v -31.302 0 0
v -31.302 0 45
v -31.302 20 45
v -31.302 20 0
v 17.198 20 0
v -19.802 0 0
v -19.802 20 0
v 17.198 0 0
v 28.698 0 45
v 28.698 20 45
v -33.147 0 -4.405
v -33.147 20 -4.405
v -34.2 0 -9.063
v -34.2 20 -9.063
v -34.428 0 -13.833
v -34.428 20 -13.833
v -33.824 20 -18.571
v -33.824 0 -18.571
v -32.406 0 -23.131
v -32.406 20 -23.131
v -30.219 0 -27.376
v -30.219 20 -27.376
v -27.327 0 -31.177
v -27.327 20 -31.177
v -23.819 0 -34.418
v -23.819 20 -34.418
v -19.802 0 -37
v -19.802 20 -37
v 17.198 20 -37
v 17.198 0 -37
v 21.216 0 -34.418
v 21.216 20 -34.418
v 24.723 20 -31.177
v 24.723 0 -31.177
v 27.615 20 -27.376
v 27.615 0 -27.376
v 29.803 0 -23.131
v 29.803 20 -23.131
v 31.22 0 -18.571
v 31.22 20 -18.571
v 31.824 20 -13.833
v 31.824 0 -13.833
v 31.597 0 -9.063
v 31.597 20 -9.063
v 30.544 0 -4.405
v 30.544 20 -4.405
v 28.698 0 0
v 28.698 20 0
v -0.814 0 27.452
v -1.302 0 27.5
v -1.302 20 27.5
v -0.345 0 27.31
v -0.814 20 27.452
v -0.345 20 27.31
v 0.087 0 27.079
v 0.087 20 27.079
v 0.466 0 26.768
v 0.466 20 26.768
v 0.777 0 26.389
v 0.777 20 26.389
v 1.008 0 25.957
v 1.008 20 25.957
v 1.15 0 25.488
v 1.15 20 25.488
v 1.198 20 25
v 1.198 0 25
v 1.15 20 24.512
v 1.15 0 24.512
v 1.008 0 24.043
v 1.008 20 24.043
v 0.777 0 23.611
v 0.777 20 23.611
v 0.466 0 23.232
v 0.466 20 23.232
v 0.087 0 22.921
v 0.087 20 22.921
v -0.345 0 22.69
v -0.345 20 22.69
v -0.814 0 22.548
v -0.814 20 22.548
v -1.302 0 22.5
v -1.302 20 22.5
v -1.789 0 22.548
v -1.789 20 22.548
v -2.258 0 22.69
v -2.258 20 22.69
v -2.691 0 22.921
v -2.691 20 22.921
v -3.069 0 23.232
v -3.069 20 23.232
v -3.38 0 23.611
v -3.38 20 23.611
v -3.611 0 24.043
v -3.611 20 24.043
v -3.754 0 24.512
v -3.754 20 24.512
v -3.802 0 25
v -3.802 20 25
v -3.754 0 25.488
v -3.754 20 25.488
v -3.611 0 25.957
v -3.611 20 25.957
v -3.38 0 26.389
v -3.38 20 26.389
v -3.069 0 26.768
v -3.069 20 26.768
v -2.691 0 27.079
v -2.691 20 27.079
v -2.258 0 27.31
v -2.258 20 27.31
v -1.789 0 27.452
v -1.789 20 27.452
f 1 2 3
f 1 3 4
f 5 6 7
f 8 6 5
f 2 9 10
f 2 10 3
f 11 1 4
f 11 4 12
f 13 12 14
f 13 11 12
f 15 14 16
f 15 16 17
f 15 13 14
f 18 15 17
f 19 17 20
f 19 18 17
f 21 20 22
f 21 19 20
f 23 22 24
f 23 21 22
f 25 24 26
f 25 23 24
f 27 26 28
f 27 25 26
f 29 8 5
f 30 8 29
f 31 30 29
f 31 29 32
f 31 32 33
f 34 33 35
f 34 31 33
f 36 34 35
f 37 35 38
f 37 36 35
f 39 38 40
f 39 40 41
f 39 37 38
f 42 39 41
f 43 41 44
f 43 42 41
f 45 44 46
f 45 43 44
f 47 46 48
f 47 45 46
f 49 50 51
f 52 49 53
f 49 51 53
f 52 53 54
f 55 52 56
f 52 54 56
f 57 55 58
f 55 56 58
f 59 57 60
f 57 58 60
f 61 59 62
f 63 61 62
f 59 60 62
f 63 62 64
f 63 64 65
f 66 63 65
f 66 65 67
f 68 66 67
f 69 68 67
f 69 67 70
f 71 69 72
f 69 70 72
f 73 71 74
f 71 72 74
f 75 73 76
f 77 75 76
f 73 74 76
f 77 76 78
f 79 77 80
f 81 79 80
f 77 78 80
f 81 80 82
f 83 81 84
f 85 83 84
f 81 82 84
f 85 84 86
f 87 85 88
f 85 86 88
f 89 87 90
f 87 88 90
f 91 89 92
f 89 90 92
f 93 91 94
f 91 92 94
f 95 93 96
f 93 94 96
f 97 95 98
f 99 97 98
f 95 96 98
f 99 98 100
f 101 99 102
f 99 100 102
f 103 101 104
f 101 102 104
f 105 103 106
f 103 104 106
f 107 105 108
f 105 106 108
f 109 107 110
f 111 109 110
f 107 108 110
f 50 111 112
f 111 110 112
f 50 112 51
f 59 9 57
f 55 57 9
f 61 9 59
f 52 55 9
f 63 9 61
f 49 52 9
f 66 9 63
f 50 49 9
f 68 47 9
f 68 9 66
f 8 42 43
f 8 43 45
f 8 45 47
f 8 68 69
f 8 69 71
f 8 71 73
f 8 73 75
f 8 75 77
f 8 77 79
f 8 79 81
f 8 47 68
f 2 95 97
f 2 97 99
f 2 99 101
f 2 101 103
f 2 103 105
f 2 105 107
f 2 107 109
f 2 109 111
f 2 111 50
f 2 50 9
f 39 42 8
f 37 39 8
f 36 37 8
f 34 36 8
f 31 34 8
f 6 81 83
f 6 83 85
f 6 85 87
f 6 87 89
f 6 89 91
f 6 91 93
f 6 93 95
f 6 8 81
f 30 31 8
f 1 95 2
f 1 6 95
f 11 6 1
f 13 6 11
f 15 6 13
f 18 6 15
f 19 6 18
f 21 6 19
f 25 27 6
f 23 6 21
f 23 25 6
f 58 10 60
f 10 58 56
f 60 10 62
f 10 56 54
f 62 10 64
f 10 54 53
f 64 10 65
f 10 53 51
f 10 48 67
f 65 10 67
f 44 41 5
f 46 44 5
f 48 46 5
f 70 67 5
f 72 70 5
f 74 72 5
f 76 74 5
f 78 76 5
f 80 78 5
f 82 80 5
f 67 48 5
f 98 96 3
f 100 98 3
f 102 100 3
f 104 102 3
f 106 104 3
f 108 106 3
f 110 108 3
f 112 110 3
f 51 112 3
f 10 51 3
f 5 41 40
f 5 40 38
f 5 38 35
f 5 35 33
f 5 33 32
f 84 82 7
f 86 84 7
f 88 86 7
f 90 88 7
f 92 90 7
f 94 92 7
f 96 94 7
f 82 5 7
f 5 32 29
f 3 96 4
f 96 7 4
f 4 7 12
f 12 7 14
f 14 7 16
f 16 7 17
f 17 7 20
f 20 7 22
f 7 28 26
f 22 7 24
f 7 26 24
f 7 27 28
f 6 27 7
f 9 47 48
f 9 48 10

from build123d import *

# Parameters (mm, degrees)
BOSS_EXTRUDE1_DEPTH = 20
SKETCH2_R           = 2.5
CUT_EXTRUDE1_DEPTH  = 20


with BuildPart() as part:
    # Sketch1 → Boss-Extrude1 (new body)
    with BuildSketch(Plane(origin=(0, 0, 0), x_dir=(1, 0, 0), z_dir=(0, 1, 0))):
        with BuildLine():
            Line((-19.801702617, 0), (17.198297383, 0))
            Line((17.198297383, 0), (17.198297383, 37))
            ThreePointArc((17.198297383, 37), (30.611248287, 20.881727984), (28.698297383, 0))
            Line((28.698297383, 0), (28.698297383, -45))
            Line((28.698297383, -45), (-31.301702617, -45))
            Line((-31.301702617, -45), (-31.301702617, 0))
            ThreePointArc((-31.301702617, 0), (-33.214653521, 20.881727984), (-19.801702617, 37))
            Line((-19.801702617, 37), (-19.801702617, 0))
        make_face()
    extrude(amount=BOSS_EXTRUDE1_DEPTH)

    # Sketch2 → Cut-Extrude1 (cut)
    with BuildSketch(Plane(origin=(0, 20, 0), x_dir=(1, 0, 0), z_dir=(0, 1, 0))):
        with Locations(Location((-1.301702617, -25, 0), (0, 0, 270))):
            Circle(SKETCH2_R)
    extrude(amount=-CUT_EXTRUDE1_DEPTH, mode=Mode.SUBTRACT)


solid = part.part
